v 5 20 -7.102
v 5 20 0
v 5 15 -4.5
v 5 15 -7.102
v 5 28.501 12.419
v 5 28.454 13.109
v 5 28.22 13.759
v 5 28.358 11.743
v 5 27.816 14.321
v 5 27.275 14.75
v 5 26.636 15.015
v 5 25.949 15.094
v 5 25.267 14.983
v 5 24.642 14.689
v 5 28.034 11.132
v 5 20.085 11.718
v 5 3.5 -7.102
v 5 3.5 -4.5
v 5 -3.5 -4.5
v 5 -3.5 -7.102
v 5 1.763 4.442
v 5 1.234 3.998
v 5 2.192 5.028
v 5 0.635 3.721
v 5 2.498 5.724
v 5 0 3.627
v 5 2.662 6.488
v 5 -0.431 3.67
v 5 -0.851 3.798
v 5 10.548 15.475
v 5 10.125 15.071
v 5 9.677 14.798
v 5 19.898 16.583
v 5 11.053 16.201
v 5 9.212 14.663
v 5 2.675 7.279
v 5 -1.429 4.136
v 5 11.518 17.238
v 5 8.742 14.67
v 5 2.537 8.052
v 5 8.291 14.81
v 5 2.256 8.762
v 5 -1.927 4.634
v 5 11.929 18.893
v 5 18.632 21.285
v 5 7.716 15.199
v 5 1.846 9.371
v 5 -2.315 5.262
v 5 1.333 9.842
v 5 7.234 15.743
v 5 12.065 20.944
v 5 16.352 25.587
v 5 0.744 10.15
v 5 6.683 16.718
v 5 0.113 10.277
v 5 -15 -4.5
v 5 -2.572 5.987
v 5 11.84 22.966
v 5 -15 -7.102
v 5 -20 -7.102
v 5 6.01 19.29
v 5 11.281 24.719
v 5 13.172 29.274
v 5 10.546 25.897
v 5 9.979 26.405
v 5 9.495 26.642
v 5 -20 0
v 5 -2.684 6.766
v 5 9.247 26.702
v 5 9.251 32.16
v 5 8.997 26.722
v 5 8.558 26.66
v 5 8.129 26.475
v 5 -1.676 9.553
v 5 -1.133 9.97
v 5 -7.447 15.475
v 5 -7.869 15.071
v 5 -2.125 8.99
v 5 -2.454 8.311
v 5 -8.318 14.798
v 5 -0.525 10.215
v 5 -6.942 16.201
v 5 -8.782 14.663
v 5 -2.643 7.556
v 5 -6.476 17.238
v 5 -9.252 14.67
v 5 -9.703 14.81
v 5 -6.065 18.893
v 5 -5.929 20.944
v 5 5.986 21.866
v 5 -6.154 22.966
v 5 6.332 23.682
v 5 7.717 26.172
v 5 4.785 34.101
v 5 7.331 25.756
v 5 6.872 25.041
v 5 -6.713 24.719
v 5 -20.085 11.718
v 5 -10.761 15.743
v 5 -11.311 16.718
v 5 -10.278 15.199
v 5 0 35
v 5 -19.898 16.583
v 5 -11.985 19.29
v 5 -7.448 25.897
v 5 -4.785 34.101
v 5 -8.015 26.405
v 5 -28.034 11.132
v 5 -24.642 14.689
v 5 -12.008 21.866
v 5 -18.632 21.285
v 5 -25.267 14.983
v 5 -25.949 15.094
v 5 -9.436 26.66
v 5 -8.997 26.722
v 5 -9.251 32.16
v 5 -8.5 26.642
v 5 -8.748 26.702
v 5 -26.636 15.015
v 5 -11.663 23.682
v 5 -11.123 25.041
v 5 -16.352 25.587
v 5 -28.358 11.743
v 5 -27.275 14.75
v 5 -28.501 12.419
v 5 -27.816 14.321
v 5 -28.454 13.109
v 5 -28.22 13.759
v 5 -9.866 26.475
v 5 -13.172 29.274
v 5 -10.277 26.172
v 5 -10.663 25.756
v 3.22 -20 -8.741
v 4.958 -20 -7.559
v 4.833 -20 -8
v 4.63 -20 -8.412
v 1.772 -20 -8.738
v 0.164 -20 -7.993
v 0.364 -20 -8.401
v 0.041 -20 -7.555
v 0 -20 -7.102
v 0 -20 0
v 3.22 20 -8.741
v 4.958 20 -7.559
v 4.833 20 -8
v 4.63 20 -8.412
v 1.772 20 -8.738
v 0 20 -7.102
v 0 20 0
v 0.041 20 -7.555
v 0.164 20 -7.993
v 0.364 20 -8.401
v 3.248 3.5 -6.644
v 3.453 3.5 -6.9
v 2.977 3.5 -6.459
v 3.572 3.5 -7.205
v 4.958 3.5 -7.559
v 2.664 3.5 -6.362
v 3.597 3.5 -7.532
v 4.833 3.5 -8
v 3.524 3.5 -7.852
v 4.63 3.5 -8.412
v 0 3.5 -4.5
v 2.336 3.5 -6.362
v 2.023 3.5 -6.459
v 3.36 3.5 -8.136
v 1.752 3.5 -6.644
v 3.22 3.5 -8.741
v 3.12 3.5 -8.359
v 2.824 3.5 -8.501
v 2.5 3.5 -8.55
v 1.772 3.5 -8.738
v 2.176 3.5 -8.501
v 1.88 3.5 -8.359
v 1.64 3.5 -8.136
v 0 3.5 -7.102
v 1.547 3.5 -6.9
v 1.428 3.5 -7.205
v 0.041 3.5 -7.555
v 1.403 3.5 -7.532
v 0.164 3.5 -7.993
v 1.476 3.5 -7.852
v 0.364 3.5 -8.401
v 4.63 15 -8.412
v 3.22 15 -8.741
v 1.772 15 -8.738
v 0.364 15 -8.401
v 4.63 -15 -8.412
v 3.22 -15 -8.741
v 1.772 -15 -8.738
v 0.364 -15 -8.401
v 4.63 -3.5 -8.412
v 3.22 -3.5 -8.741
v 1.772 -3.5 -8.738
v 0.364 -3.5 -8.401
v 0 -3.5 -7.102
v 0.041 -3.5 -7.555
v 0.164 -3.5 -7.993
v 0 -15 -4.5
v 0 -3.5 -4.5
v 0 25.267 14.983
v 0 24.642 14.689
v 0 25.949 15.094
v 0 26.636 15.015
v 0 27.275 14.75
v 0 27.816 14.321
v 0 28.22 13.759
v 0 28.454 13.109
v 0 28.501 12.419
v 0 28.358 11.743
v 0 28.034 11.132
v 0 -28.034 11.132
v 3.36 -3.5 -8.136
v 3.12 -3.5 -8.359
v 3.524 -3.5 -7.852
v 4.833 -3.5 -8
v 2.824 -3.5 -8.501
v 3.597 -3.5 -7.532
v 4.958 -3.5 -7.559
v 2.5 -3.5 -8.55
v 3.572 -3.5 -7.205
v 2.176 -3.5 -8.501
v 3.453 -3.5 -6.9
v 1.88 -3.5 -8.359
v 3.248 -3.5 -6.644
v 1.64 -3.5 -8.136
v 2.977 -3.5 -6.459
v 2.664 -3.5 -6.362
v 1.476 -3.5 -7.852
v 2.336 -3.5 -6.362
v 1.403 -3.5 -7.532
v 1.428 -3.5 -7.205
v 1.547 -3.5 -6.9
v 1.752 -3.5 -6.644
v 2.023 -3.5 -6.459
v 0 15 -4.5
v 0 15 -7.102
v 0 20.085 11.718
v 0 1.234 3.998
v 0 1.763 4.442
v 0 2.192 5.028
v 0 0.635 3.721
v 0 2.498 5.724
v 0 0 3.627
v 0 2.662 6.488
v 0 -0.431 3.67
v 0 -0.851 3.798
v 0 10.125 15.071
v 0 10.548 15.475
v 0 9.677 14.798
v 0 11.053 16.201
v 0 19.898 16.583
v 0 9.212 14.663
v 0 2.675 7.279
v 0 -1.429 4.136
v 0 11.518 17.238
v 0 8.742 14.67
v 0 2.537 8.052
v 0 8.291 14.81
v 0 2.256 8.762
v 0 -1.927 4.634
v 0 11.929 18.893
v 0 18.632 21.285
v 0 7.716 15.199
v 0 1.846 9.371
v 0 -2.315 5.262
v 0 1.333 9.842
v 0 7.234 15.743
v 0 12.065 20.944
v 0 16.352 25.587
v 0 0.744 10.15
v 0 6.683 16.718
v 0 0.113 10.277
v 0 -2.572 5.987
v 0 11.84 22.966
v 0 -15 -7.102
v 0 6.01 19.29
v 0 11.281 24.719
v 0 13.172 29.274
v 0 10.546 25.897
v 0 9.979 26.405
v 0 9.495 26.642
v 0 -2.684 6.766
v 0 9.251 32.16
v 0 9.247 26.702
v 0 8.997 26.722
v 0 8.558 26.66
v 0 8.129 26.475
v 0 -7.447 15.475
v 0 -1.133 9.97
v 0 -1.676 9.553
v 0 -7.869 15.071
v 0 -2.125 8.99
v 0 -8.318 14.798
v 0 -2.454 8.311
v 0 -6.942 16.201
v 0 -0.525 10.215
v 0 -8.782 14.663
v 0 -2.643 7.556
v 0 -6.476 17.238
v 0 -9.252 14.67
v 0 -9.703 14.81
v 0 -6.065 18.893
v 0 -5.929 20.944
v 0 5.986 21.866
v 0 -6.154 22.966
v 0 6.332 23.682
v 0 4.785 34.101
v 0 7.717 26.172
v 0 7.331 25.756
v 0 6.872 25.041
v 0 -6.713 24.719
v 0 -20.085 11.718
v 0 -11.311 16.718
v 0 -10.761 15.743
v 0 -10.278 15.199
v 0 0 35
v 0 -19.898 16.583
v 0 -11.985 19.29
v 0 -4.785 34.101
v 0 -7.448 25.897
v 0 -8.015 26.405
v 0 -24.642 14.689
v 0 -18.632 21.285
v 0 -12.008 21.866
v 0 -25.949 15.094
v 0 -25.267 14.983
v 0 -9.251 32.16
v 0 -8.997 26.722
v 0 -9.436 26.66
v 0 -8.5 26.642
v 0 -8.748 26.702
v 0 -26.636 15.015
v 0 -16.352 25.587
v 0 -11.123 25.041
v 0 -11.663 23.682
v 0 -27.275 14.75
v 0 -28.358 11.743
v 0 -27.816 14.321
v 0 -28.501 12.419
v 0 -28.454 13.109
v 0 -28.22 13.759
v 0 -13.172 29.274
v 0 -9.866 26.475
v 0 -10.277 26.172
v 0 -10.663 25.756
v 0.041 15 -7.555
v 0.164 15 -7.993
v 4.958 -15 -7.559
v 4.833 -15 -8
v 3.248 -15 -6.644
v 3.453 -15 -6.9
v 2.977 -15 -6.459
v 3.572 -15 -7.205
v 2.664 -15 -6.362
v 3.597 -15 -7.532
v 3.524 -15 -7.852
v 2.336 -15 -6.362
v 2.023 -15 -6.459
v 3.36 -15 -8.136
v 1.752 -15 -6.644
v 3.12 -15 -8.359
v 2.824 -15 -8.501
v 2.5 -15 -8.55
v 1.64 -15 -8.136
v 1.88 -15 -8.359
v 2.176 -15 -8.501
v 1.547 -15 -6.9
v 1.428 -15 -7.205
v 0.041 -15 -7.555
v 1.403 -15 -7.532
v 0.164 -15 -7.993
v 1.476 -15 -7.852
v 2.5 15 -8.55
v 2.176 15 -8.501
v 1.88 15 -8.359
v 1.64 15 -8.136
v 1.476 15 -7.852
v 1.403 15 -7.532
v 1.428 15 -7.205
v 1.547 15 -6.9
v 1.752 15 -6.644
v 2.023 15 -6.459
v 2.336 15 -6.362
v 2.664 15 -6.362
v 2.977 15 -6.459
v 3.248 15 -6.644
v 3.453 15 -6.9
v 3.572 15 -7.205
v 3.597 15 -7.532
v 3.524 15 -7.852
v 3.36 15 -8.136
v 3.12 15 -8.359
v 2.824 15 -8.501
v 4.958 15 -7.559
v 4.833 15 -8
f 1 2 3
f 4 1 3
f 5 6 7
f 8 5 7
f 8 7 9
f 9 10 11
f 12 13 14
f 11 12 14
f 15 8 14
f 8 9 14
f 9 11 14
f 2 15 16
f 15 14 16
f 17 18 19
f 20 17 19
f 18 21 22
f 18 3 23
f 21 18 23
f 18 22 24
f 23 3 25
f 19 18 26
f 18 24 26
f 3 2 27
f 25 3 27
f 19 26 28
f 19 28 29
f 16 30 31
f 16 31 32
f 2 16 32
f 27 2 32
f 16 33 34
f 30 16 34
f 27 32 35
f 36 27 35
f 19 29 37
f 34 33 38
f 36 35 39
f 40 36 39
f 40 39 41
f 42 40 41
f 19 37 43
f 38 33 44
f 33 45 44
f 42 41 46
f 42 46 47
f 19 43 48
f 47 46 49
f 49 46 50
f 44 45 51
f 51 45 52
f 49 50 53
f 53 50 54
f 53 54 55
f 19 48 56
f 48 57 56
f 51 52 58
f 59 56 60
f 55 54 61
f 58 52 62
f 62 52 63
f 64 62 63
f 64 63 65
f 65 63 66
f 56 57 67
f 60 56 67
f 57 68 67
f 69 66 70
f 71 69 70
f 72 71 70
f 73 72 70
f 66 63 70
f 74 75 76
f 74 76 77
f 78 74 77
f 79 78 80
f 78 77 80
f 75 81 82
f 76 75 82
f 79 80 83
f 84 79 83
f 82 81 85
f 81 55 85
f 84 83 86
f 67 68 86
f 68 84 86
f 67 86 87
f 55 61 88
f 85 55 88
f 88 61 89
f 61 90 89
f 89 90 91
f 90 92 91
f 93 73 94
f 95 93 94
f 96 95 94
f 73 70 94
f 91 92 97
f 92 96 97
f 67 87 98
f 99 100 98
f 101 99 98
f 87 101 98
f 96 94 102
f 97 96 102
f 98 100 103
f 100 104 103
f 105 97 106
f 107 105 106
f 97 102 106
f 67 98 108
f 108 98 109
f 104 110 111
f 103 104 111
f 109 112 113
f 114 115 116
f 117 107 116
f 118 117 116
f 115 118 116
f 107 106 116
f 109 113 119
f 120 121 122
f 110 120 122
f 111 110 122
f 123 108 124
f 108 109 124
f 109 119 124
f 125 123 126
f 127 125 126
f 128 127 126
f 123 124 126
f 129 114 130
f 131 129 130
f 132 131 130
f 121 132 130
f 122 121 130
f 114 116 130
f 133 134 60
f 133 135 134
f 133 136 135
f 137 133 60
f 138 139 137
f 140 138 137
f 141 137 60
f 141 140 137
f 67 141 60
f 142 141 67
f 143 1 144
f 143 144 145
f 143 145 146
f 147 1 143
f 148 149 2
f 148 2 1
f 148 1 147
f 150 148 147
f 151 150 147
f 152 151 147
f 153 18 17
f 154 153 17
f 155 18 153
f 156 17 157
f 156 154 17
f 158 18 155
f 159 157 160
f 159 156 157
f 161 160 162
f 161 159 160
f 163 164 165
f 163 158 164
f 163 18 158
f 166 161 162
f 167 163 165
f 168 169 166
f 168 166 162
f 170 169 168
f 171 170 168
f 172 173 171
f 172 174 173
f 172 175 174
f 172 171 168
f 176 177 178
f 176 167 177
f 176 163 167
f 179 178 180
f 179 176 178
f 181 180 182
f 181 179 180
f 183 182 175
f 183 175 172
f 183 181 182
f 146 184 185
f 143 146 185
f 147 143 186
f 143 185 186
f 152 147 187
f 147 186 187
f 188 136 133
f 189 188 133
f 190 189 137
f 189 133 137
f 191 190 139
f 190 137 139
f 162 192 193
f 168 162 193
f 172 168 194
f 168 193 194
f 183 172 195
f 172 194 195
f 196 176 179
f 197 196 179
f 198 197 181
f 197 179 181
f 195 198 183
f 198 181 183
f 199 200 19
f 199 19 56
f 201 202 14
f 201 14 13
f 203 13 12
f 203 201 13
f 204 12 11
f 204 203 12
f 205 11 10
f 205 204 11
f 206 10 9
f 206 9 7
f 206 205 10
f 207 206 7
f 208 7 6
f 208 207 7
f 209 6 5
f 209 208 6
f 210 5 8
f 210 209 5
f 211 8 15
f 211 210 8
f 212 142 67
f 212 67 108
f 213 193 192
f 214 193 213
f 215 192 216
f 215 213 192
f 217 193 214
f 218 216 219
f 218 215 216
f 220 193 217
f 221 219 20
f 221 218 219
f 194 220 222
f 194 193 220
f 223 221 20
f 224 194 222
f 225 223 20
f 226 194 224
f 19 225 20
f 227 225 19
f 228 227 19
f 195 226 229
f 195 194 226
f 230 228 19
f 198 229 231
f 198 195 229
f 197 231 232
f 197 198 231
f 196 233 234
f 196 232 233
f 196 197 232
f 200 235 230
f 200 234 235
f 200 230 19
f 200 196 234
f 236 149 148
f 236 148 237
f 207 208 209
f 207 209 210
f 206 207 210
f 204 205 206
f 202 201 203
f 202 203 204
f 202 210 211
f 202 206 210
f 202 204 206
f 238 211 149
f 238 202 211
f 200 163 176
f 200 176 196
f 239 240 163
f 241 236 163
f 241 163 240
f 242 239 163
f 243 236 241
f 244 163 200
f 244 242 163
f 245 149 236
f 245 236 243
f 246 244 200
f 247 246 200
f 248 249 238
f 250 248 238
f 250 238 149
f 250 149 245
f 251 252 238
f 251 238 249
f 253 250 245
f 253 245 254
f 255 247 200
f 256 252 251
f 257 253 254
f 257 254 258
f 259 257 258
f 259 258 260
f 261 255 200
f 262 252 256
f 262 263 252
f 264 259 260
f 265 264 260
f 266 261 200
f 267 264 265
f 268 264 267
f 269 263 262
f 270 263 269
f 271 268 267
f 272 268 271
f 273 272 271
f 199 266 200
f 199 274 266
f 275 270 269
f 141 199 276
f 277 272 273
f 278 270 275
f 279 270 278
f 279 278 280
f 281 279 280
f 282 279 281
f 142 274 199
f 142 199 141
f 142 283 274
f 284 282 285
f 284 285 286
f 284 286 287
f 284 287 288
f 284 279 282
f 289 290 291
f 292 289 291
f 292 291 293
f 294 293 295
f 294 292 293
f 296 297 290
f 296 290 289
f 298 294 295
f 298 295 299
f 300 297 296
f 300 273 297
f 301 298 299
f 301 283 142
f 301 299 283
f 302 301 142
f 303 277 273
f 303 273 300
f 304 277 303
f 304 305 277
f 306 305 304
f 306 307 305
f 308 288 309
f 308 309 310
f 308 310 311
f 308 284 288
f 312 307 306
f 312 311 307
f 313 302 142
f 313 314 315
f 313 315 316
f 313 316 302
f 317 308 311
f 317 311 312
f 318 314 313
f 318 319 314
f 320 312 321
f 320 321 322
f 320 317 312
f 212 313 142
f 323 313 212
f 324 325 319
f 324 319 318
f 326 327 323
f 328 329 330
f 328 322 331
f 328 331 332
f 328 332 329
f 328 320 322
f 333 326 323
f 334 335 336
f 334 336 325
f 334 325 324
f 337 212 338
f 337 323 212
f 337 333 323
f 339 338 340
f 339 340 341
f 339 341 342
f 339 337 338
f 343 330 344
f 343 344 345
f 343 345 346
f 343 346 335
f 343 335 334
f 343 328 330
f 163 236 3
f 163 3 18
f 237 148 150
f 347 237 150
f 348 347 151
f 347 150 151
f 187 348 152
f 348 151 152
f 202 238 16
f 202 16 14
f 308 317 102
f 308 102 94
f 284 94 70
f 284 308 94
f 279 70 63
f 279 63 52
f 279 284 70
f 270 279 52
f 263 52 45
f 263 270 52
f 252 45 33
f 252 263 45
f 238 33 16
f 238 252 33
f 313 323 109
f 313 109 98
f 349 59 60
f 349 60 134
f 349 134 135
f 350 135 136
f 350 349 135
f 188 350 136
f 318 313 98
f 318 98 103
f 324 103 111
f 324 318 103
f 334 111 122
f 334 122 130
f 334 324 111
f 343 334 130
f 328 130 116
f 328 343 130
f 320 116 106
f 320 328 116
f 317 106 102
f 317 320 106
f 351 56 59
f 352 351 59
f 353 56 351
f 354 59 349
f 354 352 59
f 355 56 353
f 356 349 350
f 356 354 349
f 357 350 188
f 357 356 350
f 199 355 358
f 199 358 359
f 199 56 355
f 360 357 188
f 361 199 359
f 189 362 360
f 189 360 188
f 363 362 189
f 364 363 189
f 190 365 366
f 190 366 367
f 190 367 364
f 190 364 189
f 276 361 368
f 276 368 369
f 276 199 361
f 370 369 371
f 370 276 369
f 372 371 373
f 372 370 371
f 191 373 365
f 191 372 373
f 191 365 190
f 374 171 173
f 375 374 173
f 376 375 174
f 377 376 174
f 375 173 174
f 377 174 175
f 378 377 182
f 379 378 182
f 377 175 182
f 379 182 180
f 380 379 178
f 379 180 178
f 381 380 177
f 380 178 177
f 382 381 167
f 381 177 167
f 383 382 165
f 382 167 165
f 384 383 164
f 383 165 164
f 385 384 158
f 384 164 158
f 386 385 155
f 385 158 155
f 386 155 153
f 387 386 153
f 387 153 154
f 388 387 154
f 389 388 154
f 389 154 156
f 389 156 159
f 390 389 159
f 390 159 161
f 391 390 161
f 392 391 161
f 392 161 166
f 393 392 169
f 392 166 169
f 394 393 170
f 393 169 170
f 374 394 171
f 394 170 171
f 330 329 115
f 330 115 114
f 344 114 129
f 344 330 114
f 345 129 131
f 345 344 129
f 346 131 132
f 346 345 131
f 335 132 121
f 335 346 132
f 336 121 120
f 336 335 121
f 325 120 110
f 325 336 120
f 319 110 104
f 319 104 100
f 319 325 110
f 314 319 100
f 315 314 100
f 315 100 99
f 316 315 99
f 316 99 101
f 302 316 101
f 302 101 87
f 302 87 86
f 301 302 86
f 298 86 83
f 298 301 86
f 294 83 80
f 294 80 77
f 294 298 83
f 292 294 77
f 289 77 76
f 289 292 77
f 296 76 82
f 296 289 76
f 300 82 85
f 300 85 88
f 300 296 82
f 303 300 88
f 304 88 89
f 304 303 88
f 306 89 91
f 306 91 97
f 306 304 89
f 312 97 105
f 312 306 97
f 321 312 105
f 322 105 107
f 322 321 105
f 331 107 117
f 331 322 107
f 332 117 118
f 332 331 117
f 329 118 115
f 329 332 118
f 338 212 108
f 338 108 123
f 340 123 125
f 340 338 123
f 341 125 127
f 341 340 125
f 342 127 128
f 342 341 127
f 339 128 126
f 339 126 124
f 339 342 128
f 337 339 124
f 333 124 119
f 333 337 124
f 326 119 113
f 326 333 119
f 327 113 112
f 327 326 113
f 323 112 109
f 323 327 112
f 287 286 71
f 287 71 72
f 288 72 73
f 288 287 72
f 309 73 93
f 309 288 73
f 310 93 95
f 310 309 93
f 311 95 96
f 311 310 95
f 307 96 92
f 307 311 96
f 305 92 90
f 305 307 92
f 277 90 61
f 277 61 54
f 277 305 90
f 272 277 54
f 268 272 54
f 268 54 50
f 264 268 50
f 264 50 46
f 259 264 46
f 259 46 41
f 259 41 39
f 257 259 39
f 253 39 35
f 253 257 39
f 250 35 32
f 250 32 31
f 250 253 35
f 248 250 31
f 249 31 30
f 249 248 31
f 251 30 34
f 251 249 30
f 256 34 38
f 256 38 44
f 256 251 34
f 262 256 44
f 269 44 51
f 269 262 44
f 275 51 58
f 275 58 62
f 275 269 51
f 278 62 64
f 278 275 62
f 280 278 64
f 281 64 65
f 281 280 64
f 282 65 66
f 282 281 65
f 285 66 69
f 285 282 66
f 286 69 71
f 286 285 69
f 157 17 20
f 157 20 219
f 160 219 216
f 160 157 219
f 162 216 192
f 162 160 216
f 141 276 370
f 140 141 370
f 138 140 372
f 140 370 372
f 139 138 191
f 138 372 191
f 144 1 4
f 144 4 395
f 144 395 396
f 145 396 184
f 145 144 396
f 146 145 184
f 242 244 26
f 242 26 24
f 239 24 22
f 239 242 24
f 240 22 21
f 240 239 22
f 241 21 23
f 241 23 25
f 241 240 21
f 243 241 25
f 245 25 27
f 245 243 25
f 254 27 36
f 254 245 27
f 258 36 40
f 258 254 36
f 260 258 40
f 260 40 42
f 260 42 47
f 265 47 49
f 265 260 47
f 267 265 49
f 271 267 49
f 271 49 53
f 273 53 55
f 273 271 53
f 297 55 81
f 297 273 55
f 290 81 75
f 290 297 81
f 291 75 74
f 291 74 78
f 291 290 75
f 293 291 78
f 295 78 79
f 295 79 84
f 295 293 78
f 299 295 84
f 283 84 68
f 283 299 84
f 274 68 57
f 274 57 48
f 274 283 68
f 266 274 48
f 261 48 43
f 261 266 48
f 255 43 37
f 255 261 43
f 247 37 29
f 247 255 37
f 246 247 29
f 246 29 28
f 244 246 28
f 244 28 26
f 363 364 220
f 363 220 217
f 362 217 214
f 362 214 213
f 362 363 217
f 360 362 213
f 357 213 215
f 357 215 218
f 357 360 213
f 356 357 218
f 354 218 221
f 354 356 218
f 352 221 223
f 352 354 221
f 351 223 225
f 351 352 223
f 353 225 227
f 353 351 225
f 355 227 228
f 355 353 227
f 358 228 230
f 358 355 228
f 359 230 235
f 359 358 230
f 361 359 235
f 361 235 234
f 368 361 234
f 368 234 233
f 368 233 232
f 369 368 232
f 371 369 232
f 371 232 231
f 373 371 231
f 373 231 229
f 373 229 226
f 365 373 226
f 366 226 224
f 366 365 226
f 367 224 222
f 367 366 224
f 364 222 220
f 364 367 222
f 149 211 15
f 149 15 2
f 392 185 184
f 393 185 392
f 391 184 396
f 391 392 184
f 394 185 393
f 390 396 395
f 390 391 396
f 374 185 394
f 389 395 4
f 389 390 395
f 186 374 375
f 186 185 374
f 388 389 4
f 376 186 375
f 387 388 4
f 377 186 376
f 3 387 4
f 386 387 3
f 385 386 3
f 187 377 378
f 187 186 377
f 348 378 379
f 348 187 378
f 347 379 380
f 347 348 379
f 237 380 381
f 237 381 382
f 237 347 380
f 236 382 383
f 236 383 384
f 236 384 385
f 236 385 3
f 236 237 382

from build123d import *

# Parameters (mm, degrees)
CROQUIS1_RX                = 6.036526162
CROQUIS1_RY                = 3.070539463
CROQUIS1_RX_2              = 3.326417752
CROQUIS1_RY_2              = 2.687947262
SALIENTE_EXTRUIR2_DEPTH    = 5
CROQUIS7_W                 = 42.690533415
CROQUIS7_H                 = 0.890099334
CORTAR_EXTRUIR1_DEPTH      = 10
REDONDEO1_R                = 2.5
CROQUIS3_R                 = 1.1
SALIENTE_EXTRUIR3_DEPTH    = 11.5
SALIENTE_EXTRUIR4_START    = 11.5
CROQUIS6_R                 = 1.1
SALIENTE_EXTRUIR4_DEPTH    = 11.5
CORTAR_EXTRUIR2_DEPTH      = 61.024571756
CORTAR_EXTRUIR2_DEPTH_BACK = 61.024571756


with BuildPart() as part:
    # Croquis1 → Saliente-Extruir2 (new body)
    with BuildSketch(Plane.YZ):
        with BuildLine():
            Line((20.084653921, 11.717525193), (24.641633022, 14.68917463))
            ThreePointArc((24.641633022, 14.68917463), (27.816291871, 14.320547257), (28.034373421, 11.132007562))
            Line((28.034373421, 11.132007562), (20, 0))
            Line((20, 0), (20, -10))
            Line((20, -10), (15, -10))
            Line((15, -10), (15, -4.5))
            Line((15, -4.5), (3.5, -4.5))
            Line((3.5, -4.5), (3.5, -10))
            Line((3.5, -10), (-3.5, -10))
            Line((-3.5, -10), (-3.5, -4.5))
            Line((-3.5, -4.5), (-15, -4.5))
            Line((-15, -4.5), (-15, -10))
            Line((-15, -10), (-20, -10))
            Line((-20, -10), (-20, 0))
            Line((-20, 0), (-28.034373421, 11.132007562))
            ThreePointArc((-28.034373421, 11.132007562), (-27.816291871, 14.320547257), (-24.641633022, 14.68917463))
            Line((-24.641633022, 14.68917463), (-20.084653921, 11.717525193))
            ThreePointArc((-20.084653921, 11.717525193), (-14.865648019, 27.519606107), (0, 35))
            ThreePointArc((0, 35), (14.865648019, 27.519606107), (20.084653921, 11.717525193))
        make_face()
        with Locations(Location((-8.99716125, 20.68522558), (0, 0, 90))):
            Ellipse(CROQUIS1_RX, CROQUIS1_RY, mode=Mode.SUBTRACT)
        with Locations(Location((0, 6.95309076), (0, 0, -90))):
            Ellipse(CROQUIS1_RX_2, CROQUIS1_RY_2, mode=Mode.SUBTRACT)
        with Locations(Location((8.99716125, 20.68522558), (0, 0, 90))):
            Ellipse(CROQUIS1_RX, CROQUIS1_RY, mode=Mode.SUBTRACT)
    extrude(amount=SALIENTE_EXTRUIR2_DEPTH)

    # Croquis7 → Cortar-Extruir1 (cut)
    with BuildSketch(Plane.YZ):
        with Locations((-0.646243402, -10.047083115)):
            Rectangle(CROQUIS7_W, CROQUIS7_H)
    extrude(amount=CORTAR_EXTRUIR1_DEPTH, mode=Mode.SUBTRACT)

    # Redondeo1
    redondeo1_edges = [part.edges().sort_by_distance(p)[0] for p in [
        (0, 17.5, -9.602033448),
        (5, 17.5, -9.602033448),
        (0, 0, -9.602033448),
        (5, 0, -9.602033448),
        (0, -17.5, -9.602033448),
        (5, -17.5, -9.602033448),
    ]]
    fillet(redondeo1_edges, radius=REDONDEO1_R - 0.0001)  # a hair under: the kernel refuses the full size

    # Croquis3 → Saliente-Extruir3 (add)
    with BuildSketch(Plane(origin=(0, 3.5, 0), x_dir=(-1, 0, 0), z_dir=(0, 1, 0))):
        with Locations(Location((-2.5, -7.45, 0), (0, 0, 270))):
            Circle(CROQUIS3_R)
    extrude(amount=SALIENTE_EXTRUIR3_DEPTH)

    # Croquis6 → Saliente-Extruir4 (add)
    with BuildSketch(Plane.XZ.offset(3.5).offset(SALIENTE_EXTRUIR4_START)):
        with Locations(Location((2.5, -7.45, 0), (0, 0, 270))):
            Circle(CROQUIS6_R)
    extrude(amount=-SALIENTE_EXTRUIR4_DEPTH)

    # Croquis8 → Cortar-Extruir2 (cut, two sides: drawn at the far end of the back side and taken through both)
    with BuildSketch(Plane(origin=(0, 20, 0), x_dir=(-1, 0, 0), z_dir=(0, 1, 0)).offset(-CORTAR_EXTRUIR2_DEPTH_BACK)):
        with BuildLine():
            Line((-74.782541857, 59.609037795), (-6.886174559, -6.99410531))
            ThreePointArc((-6.886174559, -6.99410531), (-2.511263824, -8.781661023), (1.863646912, -6.99410531))
            Line((1.863646912, -6.99410531), (69.76001421, 59.609037795))
            Line((69.76001421, 59.609037795), (69.76001421, -130.610786238))
            Line((69.76001421, -130.610786238), (-74.782541857, -130.610786238))
            Line((-74.782541857, -130.610786238), (-74.782541857, 59.609037795))
        make_face()
    extrude(amount=CORTAR_EXTRUIR2_DEPTH + CORTAR_EXTRUIR2_DEPTH_BACK, mode=Mode.SUBTRACT)


solid = part.part
